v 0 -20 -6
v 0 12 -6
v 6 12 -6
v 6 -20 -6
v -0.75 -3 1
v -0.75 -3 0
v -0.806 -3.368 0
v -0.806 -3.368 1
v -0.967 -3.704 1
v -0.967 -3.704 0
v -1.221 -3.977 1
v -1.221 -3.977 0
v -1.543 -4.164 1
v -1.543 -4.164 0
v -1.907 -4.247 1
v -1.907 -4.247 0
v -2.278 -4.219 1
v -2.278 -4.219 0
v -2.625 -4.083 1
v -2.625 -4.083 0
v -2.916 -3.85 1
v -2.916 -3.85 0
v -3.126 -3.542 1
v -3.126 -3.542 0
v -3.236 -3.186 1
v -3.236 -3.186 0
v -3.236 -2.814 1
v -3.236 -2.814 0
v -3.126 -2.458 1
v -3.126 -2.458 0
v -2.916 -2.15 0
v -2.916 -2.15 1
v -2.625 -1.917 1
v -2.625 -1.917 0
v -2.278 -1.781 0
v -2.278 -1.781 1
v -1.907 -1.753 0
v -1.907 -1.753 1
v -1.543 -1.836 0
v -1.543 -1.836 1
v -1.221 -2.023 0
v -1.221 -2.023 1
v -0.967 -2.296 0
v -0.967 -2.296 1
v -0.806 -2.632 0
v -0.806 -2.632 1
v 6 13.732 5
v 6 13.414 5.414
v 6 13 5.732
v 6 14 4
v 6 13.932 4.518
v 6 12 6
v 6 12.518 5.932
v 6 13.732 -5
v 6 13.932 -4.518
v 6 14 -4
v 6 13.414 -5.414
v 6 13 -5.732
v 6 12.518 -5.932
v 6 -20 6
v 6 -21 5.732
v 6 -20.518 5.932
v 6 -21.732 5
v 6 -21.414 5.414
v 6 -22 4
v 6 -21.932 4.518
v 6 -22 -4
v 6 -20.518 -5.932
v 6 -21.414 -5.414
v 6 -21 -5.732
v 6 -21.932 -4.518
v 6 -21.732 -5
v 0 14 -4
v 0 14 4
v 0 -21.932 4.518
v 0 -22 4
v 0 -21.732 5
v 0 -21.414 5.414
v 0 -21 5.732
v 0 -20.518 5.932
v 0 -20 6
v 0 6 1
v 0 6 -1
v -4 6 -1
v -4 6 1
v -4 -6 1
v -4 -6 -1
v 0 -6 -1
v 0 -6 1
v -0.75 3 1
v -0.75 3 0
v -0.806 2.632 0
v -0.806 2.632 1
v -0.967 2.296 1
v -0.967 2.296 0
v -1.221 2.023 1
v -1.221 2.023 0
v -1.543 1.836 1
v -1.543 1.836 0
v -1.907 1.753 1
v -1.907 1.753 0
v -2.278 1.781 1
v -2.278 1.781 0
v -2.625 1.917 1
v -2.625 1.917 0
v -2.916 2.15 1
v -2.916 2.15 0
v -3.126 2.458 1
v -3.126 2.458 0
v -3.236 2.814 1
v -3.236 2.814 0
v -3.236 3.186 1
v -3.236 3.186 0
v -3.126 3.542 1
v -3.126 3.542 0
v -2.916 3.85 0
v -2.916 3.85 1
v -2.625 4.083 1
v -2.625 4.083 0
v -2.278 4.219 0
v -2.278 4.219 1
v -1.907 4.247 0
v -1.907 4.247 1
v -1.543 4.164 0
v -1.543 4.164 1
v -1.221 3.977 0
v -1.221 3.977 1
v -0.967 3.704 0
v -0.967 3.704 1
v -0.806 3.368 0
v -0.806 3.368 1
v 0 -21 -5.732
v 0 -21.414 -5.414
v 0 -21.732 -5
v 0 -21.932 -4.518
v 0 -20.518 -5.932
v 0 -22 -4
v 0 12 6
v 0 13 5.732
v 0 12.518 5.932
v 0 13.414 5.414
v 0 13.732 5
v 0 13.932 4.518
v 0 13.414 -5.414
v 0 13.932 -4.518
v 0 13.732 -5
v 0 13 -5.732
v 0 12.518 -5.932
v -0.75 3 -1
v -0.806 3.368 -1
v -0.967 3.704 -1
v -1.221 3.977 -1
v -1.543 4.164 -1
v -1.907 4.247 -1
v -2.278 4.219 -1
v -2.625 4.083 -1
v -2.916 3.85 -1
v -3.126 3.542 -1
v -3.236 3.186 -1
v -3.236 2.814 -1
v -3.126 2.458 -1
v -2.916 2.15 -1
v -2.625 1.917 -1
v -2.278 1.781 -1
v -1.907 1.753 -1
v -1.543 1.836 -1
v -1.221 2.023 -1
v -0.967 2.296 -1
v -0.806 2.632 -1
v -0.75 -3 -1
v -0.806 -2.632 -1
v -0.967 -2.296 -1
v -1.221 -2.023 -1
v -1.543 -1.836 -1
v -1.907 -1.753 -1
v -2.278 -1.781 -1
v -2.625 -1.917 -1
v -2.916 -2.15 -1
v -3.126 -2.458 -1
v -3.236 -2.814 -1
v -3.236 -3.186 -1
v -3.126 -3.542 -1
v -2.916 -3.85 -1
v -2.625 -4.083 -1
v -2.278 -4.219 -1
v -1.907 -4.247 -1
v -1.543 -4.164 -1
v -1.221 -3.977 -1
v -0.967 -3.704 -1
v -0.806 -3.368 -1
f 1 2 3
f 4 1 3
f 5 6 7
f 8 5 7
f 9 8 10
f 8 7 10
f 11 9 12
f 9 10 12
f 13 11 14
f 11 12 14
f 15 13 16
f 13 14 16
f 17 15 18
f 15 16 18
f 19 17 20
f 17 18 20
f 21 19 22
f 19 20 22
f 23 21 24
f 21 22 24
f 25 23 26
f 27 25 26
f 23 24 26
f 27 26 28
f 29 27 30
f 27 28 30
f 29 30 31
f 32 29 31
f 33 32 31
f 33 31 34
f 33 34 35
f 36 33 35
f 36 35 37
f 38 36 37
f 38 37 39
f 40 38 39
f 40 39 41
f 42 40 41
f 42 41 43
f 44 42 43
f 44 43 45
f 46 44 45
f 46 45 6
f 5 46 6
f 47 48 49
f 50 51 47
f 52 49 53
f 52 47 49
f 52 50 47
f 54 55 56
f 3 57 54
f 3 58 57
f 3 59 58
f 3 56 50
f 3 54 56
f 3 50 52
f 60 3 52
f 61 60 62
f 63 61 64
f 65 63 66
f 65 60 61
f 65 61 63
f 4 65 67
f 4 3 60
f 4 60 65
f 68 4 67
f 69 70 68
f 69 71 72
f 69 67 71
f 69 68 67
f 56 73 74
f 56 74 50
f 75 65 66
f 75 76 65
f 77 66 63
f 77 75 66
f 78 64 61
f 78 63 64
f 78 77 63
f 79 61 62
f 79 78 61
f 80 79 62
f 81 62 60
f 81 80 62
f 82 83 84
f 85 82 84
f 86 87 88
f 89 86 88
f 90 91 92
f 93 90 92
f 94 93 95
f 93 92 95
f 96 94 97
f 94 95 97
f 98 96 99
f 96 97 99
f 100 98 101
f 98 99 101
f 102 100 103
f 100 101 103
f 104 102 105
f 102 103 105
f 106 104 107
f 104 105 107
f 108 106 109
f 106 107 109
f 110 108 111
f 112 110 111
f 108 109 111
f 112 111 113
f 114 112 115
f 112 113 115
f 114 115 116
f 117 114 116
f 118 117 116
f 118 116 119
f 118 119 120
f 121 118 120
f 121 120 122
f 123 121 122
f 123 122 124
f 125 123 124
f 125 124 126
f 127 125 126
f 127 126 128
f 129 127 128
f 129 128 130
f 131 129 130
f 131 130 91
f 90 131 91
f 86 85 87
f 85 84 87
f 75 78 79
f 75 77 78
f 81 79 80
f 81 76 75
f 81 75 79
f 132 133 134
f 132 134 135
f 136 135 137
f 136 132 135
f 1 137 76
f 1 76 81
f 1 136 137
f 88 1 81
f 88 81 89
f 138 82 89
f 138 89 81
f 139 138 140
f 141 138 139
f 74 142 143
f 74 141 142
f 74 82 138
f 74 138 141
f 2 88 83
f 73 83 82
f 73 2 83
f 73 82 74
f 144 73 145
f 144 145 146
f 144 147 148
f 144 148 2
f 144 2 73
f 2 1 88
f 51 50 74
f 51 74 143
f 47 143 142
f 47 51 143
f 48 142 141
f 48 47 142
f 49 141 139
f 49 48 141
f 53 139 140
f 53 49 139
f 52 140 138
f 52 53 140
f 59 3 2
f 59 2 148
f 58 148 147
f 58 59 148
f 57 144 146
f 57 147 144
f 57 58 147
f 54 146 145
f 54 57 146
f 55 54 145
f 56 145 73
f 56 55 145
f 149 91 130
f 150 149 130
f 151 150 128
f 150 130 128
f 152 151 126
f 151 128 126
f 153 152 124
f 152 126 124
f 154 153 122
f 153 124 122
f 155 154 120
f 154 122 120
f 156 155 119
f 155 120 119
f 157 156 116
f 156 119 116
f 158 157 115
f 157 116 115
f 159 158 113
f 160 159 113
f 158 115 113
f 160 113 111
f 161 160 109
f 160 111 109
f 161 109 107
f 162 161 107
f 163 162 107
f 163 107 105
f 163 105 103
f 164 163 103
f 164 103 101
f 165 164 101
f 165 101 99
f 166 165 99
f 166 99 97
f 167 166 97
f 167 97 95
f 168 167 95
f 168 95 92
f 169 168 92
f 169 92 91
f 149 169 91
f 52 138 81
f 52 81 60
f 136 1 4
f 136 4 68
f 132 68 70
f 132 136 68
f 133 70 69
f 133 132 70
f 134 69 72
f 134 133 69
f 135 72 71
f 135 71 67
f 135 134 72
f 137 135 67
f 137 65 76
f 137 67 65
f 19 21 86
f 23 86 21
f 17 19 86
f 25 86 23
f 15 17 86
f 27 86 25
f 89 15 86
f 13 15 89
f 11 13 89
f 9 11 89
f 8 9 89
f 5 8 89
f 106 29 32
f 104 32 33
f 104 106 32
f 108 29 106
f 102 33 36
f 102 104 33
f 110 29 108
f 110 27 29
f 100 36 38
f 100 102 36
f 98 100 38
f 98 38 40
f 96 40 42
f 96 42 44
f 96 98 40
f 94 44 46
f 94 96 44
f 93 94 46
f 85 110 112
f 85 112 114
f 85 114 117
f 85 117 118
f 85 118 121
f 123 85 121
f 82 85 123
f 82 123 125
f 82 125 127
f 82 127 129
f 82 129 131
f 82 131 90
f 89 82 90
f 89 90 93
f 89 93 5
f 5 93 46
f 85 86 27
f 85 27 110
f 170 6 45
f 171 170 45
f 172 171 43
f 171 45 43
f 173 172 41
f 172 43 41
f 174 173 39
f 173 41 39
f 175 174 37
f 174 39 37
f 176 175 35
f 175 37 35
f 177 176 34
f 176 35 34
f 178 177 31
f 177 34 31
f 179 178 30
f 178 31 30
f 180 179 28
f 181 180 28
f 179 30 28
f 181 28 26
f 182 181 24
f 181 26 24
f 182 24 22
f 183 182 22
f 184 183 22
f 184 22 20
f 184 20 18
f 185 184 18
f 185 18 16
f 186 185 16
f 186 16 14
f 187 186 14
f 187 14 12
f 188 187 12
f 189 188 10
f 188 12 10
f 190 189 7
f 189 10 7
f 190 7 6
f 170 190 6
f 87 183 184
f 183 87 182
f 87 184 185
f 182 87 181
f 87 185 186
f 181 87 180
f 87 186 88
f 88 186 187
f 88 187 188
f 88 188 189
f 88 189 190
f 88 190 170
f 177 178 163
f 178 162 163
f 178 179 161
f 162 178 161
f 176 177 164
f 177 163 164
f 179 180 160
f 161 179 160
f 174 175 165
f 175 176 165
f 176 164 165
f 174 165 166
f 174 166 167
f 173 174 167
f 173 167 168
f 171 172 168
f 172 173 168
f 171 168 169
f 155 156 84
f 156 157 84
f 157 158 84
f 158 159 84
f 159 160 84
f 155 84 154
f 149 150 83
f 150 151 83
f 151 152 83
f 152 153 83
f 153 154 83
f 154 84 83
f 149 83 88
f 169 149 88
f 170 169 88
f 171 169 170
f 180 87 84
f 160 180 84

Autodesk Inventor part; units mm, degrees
ref_plane "YZ Plane" through (0, 0, 0) normal (1, 0, 0) x (0, 1, 0)
ref_plane "XZ Plane" through (0, 0, 0) normal (0, 1, 0) x (-1, 0, 0)
ref_plane "XY Plane" through (0, 0, 0) normal (0, 0, 1) x (1, 0, 0)
sketch "Sketch1" plane through (0, 0, 0) normal (0, 0, 1) x (1, 0, 0)
  line L0 (0, 0) -> (0, 6)
  line L1 (0, 6) -> (-4, 6)
  line L2 (-4, 6) -> (-4, -6)
  line L3 (-4, -6) -> (0, -6)
  line L4 (0, -6) -> (0, 6)
  line L5 (-2, 6) -> (-2, -6)
  line L6 (-2, 6) -> (-2, 3)
  circle A0 centre (-2, 3) radius 1.25
  line L7 (-2, -6) -> (-2, -3)
  circle A1 centre (-2, -3) radius 1.25
  line L8 (0, 6) -> (0, 14)
  line L9 (0, 14) -> (6, 14)
  line L10 (6, 14) -> (6, -22)
  line L11 (6, -22) -> (0, -22)
  line L12 (0, -22) -> (0, 14)
  dimension "d44" = 6
  dimension "d45" = 4
  dimension "d46" = 12
  dimension "d47" = 3
  dimension "d48" = 2.5
  dimension "d49" = 3
  dimension "d50" = 2.5
  dimension "d51" = 8
  dimension "d52" = 6
  dimension "d53" = 36
extrude "Extrusion8" add sketch "Sketch1" along normal mid plane 2 contours L4 L3 L5 A1 A0 L1 L0 | L5 A0 A1 L3 L2 L1
extrude "Extrusion9" add sketch "Sketch1" along normal mid plane 12 contours L0 L8 L9 L10 L11 L12 L4
fillet "Fillet1" radius 2 4 edges at (3, 14, 6) (3, 14, -6) (3, -22, 6) (3, -22, -6)
sketch "Sketch2" plane through (6, -20, -6) normal (1, 0, 0) x (0, 0, -1)
  point P0 (-6, 18)
properties part number "link7" material "Aluminum 6061"
